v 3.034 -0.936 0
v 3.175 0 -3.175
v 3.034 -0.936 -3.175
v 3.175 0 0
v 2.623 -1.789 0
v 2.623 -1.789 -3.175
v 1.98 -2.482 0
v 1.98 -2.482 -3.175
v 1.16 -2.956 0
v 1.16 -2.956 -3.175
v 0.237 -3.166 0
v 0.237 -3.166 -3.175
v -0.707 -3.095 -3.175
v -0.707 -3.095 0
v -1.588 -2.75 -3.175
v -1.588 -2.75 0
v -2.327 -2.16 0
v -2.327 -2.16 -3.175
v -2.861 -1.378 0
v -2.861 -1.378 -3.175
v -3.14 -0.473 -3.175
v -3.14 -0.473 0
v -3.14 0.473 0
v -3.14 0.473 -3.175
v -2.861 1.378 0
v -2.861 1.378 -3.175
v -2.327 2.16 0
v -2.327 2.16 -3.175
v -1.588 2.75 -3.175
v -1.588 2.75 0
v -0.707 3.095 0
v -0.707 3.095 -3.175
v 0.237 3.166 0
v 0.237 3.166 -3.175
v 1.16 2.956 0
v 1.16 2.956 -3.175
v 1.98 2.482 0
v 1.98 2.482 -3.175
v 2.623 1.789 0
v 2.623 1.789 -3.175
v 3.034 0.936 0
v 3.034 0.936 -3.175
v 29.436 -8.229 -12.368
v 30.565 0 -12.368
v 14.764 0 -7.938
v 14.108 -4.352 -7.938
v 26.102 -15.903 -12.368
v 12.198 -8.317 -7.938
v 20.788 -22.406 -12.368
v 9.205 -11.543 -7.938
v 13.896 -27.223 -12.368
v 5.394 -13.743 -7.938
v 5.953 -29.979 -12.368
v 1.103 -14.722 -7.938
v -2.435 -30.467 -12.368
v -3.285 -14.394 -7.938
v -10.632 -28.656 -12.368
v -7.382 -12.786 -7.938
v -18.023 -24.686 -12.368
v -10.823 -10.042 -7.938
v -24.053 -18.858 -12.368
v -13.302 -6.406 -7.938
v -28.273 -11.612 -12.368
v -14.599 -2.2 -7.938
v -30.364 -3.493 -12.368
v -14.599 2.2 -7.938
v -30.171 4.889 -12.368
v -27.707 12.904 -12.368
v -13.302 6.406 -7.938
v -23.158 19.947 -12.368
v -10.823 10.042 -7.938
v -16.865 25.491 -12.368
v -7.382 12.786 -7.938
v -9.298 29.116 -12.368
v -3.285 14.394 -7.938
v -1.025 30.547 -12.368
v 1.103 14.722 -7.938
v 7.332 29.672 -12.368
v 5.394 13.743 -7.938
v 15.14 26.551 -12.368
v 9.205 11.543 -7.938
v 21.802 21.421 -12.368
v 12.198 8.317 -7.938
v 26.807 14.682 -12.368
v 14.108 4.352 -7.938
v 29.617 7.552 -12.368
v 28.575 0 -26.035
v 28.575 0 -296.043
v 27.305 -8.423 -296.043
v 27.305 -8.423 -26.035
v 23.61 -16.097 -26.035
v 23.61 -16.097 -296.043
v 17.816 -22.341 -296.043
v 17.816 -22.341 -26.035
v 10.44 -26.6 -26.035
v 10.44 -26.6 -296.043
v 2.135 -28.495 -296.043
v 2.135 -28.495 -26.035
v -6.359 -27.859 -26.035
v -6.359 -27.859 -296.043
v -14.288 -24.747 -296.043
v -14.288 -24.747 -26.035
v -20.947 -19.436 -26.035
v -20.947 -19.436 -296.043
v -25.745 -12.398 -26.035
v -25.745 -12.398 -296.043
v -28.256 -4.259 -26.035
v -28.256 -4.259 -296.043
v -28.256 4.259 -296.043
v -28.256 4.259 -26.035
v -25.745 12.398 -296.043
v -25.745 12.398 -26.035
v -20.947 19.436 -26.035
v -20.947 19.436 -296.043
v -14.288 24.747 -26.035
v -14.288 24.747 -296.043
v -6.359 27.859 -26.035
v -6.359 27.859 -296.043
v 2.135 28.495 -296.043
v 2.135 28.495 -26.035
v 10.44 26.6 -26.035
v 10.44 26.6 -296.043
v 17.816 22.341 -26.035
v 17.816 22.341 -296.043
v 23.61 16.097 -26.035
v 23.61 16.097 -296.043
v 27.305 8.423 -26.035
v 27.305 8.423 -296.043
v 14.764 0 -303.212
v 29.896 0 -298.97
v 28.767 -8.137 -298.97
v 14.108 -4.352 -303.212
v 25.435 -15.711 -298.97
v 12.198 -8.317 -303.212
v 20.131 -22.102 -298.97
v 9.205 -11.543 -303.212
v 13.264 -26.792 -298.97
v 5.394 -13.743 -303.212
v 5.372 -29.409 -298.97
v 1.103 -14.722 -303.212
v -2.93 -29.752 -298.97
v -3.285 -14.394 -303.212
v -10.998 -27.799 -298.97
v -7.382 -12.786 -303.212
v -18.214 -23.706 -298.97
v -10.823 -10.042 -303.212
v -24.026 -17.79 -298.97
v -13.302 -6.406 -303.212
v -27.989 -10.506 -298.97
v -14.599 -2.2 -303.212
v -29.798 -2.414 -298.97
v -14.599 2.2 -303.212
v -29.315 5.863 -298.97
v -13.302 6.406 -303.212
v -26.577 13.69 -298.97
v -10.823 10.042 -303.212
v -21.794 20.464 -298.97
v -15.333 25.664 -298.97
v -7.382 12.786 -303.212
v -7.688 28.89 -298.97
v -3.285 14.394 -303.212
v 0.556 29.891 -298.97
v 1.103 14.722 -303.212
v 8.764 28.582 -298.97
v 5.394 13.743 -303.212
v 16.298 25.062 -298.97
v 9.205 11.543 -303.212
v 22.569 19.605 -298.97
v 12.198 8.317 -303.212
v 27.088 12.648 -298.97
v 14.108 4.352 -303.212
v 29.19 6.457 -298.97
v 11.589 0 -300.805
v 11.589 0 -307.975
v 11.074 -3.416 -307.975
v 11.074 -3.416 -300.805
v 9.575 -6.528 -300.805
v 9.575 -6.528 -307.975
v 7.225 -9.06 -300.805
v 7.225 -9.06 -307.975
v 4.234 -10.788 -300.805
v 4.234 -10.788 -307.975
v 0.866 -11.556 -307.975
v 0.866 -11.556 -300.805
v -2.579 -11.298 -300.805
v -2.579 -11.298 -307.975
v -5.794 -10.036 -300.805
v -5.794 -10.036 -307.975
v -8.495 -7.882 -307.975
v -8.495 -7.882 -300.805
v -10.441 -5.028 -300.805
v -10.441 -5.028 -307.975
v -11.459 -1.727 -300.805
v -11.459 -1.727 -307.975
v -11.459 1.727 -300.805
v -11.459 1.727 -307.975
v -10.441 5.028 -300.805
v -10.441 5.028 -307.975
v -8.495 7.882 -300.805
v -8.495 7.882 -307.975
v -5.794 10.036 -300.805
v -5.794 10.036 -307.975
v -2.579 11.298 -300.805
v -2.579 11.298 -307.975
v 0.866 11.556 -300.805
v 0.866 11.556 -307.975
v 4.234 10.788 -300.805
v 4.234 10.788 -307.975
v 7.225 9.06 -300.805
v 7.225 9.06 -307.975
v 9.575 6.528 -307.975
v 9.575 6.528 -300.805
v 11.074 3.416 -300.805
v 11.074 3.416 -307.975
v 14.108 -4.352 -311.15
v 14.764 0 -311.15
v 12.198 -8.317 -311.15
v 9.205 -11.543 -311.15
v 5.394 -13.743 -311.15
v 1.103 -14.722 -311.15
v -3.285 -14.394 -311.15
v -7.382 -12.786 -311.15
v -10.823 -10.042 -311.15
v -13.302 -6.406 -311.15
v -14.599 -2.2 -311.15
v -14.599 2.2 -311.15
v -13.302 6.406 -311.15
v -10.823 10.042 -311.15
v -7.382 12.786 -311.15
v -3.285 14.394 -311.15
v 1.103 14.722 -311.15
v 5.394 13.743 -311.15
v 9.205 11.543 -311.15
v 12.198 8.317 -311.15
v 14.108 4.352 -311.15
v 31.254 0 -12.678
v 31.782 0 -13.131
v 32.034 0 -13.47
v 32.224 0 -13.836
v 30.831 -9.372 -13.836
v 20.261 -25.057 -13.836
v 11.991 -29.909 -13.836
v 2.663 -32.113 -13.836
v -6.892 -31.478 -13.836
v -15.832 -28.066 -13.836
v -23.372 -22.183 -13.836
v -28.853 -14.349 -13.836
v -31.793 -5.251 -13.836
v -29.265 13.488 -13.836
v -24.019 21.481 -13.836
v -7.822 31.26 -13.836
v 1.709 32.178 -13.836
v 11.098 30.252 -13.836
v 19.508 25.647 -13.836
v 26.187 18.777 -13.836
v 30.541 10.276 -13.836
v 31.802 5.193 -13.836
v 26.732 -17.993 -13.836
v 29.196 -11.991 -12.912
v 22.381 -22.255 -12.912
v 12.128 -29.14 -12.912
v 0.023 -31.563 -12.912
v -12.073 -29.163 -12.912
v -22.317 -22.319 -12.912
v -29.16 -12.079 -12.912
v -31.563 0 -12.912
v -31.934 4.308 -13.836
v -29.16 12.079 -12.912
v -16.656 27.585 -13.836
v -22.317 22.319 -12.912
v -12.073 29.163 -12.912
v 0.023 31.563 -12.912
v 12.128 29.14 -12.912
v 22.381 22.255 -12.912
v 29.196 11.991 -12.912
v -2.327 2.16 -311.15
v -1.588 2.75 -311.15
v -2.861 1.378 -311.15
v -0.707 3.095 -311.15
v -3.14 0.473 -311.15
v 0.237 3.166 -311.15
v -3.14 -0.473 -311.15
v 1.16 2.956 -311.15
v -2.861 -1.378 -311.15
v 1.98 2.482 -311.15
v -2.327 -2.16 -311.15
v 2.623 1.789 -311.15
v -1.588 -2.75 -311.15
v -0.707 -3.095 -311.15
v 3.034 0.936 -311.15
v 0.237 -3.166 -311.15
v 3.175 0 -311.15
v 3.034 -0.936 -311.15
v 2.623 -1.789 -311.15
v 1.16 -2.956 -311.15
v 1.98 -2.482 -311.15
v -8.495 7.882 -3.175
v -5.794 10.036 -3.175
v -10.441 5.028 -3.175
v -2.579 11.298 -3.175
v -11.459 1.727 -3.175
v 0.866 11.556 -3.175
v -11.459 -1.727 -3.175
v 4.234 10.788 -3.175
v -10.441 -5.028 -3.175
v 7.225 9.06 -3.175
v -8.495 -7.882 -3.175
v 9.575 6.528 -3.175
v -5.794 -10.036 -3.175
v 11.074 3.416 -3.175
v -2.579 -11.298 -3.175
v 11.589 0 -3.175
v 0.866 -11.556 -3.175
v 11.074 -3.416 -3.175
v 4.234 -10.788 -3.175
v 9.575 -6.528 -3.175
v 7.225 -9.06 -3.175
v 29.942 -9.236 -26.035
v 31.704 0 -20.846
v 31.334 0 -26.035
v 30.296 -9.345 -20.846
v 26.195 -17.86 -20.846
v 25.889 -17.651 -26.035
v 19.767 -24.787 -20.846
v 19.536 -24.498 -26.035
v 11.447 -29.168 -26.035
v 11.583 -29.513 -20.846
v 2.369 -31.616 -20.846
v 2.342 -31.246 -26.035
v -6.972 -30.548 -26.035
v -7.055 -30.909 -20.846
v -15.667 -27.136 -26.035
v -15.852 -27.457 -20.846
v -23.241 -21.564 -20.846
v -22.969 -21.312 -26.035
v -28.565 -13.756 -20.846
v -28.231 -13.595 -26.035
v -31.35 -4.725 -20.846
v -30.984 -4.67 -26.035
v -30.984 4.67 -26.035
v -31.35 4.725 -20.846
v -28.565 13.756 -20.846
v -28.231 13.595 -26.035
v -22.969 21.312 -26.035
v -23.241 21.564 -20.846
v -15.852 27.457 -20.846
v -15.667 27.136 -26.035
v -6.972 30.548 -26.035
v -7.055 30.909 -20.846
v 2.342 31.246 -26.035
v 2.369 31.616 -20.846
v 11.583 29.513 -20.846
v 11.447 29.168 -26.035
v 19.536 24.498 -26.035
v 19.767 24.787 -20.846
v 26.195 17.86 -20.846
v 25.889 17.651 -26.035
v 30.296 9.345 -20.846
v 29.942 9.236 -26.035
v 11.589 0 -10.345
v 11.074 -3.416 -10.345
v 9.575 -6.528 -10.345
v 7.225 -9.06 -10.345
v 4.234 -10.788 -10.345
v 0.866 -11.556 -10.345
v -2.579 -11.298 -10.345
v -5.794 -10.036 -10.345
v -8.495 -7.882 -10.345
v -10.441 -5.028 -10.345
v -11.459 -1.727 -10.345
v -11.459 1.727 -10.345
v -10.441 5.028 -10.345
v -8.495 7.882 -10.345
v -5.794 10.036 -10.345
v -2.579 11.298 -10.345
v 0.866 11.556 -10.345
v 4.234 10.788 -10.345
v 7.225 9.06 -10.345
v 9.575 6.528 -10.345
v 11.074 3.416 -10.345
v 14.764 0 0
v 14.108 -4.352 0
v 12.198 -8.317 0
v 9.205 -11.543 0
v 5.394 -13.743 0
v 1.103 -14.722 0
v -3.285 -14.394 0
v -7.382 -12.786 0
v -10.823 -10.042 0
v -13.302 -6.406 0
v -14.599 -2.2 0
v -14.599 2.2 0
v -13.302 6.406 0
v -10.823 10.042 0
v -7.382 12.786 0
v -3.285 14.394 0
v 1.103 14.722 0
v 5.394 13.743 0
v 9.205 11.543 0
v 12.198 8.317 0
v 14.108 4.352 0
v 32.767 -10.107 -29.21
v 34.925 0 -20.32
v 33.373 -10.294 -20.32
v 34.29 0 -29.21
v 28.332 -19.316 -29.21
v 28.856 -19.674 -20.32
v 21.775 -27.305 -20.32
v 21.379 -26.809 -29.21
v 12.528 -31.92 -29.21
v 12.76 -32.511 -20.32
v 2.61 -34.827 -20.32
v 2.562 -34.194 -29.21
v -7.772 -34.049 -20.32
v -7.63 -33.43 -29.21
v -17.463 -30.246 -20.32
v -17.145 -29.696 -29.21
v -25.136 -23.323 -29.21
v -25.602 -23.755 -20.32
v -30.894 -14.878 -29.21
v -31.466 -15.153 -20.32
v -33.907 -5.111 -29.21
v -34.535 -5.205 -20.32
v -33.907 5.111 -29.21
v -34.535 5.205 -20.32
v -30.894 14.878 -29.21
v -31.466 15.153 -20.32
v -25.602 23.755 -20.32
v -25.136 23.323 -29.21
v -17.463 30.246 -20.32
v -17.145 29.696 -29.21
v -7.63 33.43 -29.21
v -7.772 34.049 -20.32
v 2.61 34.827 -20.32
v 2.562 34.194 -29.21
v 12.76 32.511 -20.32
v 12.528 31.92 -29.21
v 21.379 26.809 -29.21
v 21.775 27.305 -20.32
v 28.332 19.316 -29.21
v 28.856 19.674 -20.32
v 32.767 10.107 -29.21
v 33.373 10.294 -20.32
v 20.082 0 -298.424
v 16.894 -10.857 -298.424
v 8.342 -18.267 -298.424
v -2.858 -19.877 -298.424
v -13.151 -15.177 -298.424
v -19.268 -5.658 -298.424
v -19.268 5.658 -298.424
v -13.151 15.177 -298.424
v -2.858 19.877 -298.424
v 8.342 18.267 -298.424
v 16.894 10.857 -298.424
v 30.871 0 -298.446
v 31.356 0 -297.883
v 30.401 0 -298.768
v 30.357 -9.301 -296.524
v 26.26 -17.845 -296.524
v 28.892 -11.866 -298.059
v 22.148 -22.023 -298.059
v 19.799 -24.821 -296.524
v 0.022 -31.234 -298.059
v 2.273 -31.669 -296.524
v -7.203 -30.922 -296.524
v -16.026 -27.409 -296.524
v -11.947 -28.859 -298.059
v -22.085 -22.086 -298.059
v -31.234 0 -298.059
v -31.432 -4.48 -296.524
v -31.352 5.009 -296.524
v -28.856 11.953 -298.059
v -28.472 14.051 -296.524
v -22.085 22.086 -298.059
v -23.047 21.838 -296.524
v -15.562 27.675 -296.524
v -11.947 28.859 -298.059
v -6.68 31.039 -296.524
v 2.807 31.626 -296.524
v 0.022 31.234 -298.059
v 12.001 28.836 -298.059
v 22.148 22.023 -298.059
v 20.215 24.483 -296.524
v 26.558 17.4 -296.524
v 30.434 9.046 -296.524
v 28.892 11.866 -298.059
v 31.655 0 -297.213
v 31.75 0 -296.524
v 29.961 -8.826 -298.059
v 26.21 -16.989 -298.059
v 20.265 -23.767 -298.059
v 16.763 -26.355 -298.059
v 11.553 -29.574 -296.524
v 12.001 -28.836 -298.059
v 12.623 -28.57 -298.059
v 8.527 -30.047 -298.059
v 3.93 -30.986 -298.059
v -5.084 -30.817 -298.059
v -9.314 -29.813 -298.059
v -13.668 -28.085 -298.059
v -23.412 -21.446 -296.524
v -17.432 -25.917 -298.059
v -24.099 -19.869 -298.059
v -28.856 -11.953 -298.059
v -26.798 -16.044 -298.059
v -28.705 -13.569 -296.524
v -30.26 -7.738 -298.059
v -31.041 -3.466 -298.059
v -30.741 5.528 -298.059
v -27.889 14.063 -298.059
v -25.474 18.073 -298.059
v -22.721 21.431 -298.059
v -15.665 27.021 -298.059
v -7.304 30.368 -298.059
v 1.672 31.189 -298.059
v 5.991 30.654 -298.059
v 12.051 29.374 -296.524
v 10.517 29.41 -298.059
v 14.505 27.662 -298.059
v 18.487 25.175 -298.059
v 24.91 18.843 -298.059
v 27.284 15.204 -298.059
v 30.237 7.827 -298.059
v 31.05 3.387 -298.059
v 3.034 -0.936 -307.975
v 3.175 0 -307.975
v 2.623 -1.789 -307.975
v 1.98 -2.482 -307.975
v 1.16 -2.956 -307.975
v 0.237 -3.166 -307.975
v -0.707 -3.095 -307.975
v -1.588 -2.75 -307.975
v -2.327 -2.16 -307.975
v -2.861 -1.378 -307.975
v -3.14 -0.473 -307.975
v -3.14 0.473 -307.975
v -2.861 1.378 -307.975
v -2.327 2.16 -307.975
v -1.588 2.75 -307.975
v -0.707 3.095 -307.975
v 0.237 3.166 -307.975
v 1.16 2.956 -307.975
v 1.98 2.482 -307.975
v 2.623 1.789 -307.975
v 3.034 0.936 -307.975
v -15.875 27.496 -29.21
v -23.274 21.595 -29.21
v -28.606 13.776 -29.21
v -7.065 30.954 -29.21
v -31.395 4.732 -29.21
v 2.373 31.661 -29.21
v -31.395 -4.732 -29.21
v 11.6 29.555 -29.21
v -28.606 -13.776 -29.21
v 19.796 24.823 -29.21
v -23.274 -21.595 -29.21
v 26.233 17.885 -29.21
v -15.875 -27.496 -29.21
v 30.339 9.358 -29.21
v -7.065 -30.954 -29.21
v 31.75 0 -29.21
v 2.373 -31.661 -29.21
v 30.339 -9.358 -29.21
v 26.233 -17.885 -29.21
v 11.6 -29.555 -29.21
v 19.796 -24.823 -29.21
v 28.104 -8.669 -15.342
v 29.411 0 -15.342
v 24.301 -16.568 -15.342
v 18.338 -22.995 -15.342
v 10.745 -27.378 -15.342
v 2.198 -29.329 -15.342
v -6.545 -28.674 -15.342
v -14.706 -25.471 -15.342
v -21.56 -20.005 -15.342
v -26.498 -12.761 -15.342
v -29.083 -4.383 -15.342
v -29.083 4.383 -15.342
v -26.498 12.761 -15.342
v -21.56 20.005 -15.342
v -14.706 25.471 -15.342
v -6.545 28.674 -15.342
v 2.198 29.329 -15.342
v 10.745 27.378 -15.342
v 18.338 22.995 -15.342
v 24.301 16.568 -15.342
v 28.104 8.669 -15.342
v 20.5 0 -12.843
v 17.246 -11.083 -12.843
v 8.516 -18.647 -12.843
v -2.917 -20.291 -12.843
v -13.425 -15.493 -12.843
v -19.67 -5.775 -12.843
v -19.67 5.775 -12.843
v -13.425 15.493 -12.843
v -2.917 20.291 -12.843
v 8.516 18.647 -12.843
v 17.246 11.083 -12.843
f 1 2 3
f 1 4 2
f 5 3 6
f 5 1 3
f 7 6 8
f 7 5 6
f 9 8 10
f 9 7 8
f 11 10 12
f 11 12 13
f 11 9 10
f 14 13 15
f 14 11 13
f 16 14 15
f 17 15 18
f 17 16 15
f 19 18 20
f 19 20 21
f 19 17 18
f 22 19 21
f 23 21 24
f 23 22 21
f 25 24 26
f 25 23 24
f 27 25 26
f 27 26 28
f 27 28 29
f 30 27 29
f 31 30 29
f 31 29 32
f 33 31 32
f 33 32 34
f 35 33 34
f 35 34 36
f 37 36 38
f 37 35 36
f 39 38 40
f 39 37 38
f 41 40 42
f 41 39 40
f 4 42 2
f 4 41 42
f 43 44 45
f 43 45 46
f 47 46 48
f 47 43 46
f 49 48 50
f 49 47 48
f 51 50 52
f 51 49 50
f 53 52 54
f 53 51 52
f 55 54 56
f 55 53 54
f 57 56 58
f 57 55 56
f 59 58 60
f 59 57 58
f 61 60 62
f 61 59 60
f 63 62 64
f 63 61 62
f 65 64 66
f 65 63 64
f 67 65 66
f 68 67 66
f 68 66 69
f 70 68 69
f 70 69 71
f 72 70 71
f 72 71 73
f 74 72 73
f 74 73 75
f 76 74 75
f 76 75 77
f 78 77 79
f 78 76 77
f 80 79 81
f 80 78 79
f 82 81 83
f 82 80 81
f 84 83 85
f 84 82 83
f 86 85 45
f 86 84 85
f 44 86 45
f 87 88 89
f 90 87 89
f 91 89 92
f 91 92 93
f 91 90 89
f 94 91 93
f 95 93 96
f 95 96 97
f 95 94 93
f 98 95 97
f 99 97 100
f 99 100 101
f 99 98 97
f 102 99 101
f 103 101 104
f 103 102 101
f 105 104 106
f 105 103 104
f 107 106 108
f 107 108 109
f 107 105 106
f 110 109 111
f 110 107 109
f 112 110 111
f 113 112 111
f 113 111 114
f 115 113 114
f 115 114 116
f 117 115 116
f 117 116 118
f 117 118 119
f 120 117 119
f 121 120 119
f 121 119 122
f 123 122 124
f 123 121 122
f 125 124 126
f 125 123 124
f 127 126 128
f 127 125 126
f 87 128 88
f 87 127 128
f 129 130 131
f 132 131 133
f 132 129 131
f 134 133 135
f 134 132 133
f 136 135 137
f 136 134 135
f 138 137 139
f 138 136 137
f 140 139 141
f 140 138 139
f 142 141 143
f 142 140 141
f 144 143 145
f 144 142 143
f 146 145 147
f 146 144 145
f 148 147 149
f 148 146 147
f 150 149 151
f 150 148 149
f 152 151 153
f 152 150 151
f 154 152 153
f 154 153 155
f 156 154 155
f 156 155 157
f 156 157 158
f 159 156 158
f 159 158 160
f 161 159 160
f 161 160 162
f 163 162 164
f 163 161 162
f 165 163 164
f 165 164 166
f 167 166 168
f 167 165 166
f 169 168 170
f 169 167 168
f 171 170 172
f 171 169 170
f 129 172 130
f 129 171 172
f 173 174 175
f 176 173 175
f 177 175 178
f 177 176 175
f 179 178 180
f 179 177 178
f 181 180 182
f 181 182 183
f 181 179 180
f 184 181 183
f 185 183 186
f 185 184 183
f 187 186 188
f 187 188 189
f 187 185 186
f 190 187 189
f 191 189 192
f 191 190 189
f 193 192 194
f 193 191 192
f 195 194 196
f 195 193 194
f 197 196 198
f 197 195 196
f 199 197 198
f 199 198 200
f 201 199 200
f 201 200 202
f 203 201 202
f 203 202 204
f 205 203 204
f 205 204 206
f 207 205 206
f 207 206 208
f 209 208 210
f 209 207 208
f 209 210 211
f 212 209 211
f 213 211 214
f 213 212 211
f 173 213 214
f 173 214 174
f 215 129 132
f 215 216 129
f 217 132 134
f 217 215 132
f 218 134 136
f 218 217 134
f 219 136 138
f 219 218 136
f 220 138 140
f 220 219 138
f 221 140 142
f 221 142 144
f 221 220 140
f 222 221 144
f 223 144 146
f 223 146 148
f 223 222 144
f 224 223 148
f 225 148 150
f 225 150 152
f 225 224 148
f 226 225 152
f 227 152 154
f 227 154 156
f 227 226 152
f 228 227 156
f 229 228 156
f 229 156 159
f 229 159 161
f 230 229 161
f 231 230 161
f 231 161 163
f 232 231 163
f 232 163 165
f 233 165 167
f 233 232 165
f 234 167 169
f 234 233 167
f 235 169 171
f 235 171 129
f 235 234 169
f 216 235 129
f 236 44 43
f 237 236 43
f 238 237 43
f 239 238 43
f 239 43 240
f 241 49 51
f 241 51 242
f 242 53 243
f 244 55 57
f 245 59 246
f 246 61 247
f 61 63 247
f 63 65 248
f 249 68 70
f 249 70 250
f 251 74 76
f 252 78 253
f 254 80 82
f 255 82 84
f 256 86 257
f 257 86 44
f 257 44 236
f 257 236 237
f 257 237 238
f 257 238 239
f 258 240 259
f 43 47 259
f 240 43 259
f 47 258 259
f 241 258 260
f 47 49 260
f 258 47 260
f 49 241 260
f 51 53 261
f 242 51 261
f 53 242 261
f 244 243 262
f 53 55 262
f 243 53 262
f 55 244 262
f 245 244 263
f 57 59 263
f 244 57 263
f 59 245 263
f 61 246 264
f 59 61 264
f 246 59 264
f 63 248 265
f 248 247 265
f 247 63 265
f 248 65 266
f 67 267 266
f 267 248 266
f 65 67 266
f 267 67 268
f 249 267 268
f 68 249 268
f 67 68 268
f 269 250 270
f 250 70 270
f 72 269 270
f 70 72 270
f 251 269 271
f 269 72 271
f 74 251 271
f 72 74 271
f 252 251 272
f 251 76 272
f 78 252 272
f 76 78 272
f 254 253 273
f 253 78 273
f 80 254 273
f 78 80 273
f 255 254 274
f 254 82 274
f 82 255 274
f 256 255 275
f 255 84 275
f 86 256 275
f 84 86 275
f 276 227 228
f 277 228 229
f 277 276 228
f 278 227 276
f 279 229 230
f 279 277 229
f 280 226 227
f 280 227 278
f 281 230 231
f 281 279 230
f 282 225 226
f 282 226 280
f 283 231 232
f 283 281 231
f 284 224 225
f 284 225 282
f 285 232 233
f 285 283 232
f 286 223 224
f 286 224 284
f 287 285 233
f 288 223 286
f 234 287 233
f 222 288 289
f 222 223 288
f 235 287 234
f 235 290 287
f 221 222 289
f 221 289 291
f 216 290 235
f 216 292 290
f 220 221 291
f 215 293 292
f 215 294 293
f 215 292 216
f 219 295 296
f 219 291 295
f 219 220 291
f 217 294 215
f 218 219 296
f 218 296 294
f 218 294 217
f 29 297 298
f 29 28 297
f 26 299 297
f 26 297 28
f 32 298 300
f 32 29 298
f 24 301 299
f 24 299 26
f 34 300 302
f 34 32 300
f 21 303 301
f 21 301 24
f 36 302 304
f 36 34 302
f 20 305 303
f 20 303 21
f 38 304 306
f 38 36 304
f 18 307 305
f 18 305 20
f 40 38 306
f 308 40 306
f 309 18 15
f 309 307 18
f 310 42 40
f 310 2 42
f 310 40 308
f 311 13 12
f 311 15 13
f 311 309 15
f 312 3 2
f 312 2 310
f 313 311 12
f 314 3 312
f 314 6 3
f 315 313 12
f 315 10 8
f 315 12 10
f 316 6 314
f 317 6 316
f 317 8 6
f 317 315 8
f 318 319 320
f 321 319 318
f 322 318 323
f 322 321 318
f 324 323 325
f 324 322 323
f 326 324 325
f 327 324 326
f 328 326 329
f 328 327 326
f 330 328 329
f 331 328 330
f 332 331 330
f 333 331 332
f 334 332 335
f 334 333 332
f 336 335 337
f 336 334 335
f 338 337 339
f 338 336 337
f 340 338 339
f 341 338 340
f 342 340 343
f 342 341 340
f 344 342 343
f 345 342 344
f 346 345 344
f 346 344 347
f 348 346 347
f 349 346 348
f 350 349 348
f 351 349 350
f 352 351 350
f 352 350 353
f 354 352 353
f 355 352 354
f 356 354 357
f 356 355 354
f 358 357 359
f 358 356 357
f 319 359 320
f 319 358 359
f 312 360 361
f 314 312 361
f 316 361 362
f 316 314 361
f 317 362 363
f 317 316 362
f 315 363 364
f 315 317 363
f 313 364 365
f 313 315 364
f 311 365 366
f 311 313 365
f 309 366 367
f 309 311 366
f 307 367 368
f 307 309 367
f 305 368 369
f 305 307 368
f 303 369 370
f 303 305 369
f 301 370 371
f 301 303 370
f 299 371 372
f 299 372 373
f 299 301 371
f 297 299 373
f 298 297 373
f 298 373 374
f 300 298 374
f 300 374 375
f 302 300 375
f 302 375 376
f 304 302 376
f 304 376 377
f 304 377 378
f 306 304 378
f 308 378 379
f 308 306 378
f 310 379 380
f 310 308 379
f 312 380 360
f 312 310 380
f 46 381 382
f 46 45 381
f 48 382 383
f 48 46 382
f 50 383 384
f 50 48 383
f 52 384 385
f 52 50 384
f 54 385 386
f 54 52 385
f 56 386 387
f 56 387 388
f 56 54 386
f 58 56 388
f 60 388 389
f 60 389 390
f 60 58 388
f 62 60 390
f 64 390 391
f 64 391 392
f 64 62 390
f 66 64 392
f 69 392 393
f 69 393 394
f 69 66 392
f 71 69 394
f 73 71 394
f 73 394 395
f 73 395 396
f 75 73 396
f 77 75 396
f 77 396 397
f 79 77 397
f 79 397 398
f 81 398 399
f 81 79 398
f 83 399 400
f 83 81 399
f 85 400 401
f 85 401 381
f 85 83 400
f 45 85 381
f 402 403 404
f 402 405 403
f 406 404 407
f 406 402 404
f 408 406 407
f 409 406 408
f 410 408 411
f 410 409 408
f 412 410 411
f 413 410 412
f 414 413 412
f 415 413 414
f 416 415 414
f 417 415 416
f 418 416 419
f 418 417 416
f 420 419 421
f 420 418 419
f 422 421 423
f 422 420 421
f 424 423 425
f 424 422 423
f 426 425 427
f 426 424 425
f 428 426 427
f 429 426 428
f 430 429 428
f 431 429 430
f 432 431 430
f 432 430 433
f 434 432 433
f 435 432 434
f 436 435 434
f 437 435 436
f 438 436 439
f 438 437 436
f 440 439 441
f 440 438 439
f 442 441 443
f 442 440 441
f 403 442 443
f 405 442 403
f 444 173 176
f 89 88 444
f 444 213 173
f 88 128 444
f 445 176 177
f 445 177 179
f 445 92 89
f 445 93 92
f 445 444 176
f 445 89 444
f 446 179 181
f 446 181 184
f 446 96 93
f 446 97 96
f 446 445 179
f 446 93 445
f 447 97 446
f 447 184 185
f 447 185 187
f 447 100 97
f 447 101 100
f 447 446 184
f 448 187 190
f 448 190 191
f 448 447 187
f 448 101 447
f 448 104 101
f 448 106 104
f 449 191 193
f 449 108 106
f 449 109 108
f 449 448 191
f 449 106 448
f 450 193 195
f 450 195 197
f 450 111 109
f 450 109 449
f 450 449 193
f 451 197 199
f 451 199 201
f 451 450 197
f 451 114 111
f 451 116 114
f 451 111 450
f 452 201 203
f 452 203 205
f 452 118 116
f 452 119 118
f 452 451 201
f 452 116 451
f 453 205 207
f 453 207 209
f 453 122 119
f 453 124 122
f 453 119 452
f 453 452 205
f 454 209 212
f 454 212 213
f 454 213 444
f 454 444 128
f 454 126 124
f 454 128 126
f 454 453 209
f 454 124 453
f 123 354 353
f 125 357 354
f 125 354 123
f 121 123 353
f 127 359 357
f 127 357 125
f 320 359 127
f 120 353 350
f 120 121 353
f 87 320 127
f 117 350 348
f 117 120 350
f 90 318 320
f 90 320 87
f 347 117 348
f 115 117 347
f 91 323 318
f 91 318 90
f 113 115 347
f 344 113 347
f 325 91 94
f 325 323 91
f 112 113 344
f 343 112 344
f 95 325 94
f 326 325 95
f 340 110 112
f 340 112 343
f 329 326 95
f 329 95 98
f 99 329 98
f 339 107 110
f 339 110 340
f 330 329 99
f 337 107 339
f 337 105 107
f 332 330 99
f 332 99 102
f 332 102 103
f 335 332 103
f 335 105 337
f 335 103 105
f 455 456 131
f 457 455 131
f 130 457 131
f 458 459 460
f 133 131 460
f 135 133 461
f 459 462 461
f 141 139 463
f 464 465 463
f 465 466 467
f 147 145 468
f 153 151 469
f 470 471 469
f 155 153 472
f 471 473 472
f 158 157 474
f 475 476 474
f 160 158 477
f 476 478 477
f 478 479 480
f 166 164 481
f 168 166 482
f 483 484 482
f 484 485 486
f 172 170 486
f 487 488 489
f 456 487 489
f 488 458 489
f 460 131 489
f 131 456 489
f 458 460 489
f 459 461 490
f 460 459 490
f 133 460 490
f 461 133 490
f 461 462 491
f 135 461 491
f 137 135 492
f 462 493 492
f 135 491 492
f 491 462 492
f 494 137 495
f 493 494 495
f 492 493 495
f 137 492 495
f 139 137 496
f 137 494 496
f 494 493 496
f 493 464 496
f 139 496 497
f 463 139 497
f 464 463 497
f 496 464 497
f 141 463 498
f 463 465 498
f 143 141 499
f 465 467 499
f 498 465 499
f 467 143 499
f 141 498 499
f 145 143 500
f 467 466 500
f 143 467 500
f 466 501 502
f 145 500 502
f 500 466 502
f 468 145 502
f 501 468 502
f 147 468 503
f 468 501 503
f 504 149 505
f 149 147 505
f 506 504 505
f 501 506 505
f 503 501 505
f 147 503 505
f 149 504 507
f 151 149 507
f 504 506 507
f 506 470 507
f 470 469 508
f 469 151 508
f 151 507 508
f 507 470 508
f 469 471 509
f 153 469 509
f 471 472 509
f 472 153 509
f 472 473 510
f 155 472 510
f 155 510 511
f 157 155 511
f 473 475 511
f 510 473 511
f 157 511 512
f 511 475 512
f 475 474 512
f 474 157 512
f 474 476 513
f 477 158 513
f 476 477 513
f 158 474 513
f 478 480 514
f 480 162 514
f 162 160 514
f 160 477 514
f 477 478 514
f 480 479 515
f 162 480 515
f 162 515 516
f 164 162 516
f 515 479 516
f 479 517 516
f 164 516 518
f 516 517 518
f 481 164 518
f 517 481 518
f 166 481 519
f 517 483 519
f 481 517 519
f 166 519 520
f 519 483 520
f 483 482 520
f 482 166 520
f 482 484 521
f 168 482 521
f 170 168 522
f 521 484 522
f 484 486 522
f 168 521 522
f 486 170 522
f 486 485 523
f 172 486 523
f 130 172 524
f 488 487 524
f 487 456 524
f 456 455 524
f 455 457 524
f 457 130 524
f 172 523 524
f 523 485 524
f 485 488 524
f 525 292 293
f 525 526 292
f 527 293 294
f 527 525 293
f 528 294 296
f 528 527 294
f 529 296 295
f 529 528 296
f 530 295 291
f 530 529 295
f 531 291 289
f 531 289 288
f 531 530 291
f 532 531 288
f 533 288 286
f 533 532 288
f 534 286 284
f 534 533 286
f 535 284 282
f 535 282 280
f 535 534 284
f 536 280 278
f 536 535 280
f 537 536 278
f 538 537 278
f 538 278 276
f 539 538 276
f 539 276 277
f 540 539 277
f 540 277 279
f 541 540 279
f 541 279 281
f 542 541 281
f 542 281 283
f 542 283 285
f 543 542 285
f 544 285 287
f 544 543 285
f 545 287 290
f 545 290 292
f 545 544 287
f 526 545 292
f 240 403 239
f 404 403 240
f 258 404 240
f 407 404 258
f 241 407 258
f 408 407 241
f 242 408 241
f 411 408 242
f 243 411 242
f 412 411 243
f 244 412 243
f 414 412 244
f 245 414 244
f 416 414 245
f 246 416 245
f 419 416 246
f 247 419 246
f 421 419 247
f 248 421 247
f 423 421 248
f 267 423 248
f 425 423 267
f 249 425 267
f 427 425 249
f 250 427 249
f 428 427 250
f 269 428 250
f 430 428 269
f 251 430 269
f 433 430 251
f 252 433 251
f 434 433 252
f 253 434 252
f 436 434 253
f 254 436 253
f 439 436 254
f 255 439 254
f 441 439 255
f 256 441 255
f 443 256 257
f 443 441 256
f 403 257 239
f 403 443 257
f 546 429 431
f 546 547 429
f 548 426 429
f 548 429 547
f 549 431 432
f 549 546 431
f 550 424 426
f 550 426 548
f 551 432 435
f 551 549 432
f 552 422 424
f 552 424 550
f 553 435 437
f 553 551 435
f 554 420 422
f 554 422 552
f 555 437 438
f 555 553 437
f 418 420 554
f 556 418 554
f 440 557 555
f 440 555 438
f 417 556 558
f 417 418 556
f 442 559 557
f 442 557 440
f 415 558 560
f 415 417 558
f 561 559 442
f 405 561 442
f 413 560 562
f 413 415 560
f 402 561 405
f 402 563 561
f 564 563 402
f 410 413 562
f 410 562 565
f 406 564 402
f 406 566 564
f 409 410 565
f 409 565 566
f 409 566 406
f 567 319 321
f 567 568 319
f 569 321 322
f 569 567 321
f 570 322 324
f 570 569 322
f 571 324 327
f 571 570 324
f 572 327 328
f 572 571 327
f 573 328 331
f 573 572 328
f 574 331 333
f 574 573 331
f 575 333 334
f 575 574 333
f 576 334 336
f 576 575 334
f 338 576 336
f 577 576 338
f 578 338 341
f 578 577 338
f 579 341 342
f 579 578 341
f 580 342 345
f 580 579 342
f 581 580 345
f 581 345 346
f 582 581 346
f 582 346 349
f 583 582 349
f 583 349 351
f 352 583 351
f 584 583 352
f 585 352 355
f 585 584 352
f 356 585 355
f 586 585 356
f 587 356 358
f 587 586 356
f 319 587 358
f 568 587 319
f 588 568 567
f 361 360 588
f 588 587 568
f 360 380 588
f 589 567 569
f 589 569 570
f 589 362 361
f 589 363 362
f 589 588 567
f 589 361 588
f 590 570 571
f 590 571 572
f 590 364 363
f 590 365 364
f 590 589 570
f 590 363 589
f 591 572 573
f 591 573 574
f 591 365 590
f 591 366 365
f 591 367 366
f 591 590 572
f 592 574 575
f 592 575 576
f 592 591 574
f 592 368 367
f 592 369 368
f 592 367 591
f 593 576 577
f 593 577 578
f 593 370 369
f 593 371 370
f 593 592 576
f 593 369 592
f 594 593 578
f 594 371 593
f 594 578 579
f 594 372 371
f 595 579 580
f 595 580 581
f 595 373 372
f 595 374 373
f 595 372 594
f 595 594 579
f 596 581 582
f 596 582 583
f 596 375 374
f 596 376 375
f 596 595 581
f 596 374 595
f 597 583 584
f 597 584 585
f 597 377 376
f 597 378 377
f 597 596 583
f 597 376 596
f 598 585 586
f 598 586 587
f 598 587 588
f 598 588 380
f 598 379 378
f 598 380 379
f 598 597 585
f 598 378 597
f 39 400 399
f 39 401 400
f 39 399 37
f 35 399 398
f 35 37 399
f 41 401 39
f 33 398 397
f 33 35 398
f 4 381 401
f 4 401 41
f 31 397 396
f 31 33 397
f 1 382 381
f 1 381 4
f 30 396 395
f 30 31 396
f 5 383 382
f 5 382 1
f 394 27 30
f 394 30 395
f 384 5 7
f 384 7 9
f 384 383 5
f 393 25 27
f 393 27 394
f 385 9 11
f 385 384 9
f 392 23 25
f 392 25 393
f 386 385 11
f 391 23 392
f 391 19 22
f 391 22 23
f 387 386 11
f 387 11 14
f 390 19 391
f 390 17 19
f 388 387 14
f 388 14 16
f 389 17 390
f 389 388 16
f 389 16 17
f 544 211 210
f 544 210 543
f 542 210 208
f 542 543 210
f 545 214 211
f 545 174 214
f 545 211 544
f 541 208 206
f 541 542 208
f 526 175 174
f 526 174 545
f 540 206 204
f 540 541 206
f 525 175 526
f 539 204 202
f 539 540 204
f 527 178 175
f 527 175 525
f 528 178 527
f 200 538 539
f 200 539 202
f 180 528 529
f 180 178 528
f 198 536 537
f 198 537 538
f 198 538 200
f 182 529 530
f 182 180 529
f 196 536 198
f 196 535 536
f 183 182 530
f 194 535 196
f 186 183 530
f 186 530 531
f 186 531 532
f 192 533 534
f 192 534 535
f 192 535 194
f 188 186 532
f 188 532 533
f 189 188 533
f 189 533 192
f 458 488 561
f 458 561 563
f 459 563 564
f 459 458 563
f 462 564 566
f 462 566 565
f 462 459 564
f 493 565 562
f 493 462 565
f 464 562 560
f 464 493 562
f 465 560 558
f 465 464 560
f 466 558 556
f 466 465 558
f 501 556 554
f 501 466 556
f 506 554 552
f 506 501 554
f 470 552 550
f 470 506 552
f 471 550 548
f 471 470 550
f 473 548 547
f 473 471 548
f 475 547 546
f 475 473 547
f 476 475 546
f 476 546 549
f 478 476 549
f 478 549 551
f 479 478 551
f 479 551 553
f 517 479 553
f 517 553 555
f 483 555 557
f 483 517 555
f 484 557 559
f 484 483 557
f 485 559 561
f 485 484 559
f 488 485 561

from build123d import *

# Parameters (mm, degrees)
FILLET1_R = 2.54


with BuildPart() as part:
    # Sketch1 → Revolve1 (revolve)
    with BuildSketch(Plane(origin=(0, 0, 0), x_dir=(0, 0, -1), z_dir=(1, 0, 0)), mode=Mode.PRIVATE) as revolve1_sk:
        Polygon((0, 14.76375), (7.9375, 14.76375), (12.7, 31.75), (20.32, 34.925), (29.21, 34.29), (29.21, 31.75), (298.45, 31.75), (303.2125, 14.76375), (311.15, 14.76375), (311.15, 3.175), (307.975, 3.175), (307.975, 11.58875), (300.805254923, 11.58875), (296.042754923, 28.575), (26.035, 28.575), (26.035, 31.333696529), (20.845500206, 31.704375086), (15.341669029, 29.411112095), (10.344745077, 11.58875), (3.175, 11.58875), (3.175, 3.175), (0, 3.175), align=None)
    revolve(revolve1_sk.sketch.rotate(Axis((0, 0, 0), (0, 0, -1)), 90), axis=Axis((0, 0, 0), (0, 0, -1)))

    # Fillet1
    fillet1_edges = [part.edges().sort_by_distance(p)[0] for p in [
        (-31.75, 0, -298.45),
        (-31.75, 0, -12.7),
    ]]
    fillet(fillet1_edges, radius=FILLET1_R)


solid = part.part
